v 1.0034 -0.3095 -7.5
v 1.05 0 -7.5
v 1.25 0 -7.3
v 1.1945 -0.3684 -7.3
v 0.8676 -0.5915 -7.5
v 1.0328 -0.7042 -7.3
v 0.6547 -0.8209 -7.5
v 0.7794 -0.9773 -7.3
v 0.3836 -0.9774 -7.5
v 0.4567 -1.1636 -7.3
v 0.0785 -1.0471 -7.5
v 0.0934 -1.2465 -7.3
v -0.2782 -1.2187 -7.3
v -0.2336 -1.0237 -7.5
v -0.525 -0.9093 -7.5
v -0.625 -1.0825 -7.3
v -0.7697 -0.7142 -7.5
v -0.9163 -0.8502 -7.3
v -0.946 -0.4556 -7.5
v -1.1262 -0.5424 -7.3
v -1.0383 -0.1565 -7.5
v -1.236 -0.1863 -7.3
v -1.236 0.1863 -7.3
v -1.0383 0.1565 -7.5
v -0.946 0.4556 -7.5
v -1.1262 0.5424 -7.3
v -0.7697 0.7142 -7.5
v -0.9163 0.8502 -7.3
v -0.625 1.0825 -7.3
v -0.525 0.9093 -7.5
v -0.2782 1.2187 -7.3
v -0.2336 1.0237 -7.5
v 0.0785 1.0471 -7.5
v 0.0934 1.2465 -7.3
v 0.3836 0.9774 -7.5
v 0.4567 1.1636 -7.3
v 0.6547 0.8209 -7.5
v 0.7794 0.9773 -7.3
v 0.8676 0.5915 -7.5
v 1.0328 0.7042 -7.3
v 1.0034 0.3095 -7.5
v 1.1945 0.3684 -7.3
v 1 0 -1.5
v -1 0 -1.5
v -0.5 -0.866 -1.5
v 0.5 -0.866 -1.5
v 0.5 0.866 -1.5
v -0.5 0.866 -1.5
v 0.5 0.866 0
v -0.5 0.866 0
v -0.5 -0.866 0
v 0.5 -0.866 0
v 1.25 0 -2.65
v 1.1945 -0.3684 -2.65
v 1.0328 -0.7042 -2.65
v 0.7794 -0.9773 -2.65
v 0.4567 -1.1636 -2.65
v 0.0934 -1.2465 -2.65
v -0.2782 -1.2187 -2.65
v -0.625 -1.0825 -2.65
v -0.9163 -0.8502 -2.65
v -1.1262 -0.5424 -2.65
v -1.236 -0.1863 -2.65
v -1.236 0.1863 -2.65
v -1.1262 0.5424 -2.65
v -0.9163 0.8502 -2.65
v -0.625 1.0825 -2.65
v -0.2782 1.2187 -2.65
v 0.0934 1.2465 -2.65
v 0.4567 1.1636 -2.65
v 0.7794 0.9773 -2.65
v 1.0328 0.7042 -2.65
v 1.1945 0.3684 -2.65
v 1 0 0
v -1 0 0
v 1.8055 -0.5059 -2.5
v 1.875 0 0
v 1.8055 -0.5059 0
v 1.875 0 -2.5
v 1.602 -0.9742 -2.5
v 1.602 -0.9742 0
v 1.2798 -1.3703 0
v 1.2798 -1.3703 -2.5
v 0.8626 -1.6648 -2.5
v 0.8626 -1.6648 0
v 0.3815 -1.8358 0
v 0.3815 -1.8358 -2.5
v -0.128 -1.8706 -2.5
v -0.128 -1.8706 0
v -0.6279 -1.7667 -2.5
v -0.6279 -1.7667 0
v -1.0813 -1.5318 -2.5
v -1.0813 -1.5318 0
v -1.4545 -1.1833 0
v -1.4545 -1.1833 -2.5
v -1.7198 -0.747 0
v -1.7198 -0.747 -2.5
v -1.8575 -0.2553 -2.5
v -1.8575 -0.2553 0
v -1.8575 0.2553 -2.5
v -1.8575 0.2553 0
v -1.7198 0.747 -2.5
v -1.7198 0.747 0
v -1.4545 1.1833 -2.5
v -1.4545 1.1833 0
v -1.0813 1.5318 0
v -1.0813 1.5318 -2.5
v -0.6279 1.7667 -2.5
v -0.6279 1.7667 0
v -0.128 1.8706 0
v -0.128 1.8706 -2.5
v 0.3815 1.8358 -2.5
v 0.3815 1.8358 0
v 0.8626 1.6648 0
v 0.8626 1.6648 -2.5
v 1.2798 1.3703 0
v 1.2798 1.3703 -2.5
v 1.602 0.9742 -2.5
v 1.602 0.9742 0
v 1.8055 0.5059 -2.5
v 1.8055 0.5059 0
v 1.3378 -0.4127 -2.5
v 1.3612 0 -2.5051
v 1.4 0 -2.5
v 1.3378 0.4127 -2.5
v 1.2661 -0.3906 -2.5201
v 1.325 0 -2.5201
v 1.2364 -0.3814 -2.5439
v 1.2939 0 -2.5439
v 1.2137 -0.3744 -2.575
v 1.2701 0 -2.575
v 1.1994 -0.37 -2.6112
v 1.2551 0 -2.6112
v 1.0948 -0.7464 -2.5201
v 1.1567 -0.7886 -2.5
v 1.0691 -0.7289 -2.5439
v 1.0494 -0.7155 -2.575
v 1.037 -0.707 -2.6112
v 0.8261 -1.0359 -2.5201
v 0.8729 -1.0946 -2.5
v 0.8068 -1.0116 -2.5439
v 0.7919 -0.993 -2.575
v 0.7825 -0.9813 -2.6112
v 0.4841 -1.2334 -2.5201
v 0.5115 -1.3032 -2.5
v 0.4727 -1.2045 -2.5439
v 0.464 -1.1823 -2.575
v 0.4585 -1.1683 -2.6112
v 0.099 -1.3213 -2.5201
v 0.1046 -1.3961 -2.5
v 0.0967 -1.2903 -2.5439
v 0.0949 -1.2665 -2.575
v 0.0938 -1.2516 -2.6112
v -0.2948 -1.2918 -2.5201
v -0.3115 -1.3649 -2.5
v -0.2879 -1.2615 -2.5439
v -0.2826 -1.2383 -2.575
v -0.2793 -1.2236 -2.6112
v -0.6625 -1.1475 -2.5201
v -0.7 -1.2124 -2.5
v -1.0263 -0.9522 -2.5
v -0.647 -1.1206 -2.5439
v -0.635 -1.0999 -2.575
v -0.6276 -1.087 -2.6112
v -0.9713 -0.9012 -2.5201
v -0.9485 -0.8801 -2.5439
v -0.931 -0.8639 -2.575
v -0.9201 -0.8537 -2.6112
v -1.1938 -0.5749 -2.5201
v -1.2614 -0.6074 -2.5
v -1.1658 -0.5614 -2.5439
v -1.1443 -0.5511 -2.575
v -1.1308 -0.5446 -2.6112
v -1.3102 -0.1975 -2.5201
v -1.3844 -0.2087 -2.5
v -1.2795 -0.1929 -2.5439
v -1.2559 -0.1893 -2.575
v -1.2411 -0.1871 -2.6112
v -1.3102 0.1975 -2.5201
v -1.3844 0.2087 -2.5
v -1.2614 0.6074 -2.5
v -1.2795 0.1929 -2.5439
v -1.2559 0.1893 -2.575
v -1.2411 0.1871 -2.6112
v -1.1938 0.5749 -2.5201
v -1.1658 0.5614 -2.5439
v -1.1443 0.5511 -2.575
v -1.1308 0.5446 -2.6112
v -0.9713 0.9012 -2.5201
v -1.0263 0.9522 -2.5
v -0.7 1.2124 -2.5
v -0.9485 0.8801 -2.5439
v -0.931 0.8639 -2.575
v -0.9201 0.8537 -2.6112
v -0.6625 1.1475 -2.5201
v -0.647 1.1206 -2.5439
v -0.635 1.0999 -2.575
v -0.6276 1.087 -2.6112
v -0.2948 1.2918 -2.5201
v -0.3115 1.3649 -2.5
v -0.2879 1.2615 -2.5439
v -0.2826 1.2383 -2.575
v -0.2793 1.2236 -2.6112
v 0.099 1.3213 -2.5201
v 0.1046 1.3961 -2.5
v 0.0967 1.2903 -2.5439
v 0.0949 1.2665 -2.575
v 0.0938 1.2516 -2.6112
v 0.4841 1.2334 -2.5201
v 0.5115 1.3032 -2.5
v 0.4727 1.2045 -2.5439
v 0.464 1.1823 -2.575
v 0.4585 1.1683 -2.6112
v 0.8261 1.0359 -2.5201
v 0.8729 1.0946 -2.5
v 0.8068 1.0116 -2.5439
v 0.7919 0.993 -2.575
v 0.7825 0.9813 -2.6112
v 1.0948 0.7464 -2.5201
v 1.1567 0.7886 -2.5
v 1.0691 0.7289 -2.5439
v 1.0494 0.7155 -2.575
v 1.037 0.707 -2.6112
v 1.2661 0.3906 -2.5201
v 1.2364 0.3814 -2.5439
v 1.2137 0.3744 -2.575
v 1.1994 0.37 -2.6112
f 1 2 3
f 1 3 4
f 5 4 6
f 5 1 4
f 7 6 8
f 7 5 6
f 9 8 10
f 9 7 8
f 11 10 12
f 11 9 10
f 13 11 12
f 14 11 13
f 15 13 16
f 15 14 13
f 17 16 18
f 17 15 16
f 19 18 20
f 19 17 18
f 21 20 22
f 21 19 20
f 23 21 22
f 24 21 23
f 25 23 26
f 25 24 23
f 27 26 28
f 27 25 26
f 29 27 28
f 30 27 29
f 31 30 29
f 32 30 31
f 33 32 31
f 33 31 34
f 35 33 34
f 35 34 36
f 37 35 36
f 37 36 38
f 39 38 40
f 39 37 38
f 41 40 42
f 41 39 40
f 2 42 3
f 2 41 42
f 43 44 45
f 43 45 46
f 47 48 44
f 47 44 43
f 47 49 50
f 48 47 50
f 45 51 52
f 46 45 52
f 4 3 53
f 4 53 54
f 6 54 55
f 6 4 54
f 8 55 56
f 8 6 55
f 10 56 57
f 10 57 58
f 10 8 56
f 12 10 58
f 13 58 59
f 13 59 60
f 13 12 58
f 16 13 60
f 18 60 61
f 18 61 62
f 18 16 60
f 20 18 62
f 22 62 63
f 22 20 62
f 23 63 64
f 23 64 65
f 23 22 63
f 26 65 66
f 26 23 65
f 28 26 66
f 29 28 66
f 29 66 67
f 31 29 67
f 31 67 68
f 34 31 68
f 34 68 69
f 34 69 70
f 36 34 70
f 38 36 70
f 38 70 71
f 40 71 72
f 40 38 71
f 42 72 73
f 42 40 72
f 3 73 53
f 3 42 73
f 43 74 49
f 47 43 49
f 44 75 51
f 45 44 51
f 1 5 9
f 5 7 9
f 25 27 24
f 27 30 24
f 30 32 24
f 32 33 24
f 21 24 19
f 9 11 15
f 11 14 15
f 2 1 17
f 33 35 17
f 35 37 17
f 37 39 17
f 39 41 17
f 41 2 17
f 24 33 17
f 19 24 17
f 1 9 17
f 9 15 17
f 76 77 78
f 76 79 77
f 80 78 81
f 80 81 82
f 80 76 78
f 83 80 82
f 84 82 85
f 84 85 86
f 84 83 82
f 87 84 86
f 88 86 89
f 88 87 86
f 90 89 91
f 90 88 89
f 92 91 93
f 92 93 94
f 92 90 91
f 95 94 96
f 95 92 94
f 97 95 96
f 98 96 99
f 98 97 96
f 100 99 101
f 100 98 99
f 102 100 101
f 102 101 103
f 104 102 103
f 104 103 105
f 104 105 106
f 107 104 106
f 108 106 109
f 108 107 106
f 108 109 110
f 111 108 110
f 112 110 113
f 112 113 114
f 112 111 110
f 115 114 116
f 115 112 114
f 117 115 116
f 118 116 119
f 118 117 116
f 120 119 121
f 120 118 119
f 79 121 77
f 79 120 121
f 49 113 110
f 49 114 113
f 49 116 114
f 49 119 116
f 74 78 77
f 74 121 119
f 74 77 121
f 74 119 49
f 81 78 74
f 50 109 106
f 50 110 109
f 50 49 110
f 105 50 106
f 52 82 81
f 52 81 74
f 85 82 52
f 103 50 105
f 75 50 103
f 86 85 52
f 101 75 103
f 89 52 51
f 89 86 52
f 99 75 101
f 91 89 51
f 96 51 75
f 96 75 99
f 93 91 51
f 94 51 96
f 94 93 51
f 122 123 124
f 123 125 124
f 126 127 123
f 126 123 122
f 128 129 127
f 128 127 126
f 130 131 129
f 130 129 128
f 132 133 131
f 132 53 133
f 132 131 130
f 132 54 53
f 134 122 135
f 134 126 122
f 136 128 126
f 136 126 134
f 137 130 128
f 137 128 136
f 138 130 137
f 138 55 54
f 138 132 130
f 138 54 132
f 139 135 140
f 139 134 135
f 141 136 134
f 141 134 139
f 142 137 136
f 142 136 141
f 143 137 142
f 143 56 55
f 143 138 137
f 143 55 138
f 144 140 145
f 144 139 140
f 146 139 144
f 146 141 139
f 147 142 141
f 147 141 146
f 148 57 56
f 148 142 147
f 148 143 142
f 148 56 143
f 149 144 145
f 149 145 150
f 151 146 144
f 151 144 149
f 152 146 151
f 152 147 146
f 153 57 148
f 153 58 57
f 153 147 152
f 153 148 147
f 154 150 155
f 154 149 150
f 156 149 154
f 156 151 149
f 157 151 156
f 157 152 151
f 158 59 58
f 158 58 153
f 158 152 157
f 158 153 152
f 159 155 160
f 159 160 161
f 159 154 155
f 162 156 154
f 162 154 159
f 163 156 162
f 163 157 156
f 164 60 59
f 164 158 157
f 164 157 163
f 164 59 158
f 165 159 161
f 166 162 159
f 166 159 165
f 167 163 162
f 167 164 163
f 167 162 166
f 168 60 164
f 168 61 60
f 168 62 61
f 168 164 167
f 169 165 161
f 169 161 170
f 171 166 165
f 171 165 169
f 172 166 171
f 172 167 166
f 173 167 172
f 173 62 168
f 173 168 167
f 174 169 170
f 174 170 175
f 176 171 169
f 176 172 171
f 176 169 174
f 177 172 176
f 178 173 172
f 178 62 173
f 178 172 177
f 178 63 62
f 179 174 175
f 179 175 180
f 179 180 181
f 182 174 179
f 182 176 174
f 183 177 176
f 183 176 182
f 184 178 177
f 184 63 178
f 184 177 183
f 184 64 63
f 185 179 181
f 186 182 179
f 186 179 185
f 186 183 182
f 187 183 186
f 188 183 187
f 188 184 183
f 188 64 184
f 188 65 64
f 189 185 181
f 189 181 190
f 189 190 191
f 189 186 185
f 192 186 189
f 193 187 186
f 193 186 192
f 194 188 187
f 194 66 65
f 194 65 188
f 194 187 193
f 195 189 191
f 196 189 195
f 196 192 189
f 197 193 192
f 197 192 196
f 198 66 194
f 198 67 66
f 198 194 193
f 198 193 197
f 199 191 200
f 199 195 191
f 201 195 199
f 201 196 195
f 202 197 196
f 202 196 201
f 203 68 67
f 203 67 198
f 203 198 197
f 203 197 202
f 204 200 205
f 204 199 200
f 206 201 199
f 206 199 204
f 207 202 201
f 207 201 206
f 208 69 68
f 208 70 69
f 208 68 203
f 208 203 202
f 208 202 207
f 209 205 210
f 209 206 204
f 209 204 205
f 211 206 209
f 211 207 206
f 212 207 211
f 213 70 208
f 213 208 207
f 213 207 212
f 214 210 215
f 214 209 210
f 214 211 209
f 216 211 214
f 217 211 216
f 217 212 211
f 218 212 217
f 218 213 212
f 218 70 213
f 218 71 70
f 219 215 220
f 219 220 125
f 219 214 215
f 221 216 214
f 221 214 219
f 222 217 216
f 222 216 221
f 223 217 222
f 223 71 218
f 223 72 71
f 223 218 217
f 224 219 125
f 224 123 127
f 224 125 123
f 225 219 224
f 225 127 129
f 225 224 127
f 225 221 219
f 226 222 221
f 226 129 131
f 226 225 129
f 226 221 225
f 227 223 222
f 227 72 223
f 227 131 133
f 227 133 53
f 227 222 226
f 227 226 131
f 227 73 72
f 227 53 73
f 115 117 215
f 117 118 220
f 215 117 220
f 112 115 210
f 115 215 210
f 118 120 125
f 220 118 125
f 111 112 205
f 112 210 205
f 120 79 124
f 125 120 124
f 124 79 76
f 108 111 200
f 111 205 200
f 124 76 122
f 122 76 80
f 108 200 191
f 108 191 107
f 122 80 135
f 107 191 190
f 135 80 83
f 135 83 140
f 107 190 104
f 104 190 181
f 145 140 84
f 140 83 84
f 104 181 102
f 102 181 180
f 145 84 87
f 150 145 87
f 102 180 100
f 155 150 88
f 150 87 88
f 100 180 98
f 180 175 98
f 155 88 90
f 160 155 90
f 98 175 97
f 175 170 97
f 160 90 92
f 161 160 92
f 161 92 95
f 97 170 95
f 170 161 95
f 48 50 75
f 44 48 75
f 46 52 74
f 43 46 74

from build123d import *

# Parameters (mm, degrees)
SKETCH1_W          = 1.875
SKETCH1_H          = 2.5
SKETCH1_W_2        = 1.25
SKETCH1_H_2        = 5
CUT_EXTRUDE1_DEPTH = 1.5
FILLET1_R          = 0.15
CHAMFER1_SIZE      = 0.2


with BuildPart() as part:
    # Sketch1 → Revolve1 (revolve)
    with BuildSketch(Plane(origin=(0, 0, 0), x_dir=(1, 0, 0), z_dir=(0, 1, 0))):
        with Locations((0.9375, 1.25)):
            Rectangle(SKETCH1_W, SKETCH1_H)
        with Locations((0.625, 5)):
            Rectangle(SKETCH1_W_2, SKETCH1_H_2)
    revolve(axis=Axis((0, 0, -2.5), (0, 0, -1)))

    # Sketch2 → Cut-Extrude1 (cut)
    with BuildSketch(Plane.XY):
        Polygon((1, 0), (0.5, 0.866025404), (-0.5, 0.866025404), (-1, 0), (-0.5, -0.866025404), (0.5, -0.866025404), align=None)
    extrude(amount=-CUT_EXTRUDE1_DEPTH, mode=Mode.SUBTRACT)

    # Fillet1
    fillet1_edges = [part.edges().sort_by_distance(p)[0] for p in [
        (-1.25, 0, -2.5),
    ]]
    fillet(fillet1_edges, radius=FILLET1_R)

    # Chamfer1
    chamfer1_edges = [part.edges().sort_by_distance(p)[0] for p in [
        (-1.25, 0, -7.5),
    ]]
    chamfer(chamfer1_edges, length=CHAMFER1_SIZE)


solid = part.part
